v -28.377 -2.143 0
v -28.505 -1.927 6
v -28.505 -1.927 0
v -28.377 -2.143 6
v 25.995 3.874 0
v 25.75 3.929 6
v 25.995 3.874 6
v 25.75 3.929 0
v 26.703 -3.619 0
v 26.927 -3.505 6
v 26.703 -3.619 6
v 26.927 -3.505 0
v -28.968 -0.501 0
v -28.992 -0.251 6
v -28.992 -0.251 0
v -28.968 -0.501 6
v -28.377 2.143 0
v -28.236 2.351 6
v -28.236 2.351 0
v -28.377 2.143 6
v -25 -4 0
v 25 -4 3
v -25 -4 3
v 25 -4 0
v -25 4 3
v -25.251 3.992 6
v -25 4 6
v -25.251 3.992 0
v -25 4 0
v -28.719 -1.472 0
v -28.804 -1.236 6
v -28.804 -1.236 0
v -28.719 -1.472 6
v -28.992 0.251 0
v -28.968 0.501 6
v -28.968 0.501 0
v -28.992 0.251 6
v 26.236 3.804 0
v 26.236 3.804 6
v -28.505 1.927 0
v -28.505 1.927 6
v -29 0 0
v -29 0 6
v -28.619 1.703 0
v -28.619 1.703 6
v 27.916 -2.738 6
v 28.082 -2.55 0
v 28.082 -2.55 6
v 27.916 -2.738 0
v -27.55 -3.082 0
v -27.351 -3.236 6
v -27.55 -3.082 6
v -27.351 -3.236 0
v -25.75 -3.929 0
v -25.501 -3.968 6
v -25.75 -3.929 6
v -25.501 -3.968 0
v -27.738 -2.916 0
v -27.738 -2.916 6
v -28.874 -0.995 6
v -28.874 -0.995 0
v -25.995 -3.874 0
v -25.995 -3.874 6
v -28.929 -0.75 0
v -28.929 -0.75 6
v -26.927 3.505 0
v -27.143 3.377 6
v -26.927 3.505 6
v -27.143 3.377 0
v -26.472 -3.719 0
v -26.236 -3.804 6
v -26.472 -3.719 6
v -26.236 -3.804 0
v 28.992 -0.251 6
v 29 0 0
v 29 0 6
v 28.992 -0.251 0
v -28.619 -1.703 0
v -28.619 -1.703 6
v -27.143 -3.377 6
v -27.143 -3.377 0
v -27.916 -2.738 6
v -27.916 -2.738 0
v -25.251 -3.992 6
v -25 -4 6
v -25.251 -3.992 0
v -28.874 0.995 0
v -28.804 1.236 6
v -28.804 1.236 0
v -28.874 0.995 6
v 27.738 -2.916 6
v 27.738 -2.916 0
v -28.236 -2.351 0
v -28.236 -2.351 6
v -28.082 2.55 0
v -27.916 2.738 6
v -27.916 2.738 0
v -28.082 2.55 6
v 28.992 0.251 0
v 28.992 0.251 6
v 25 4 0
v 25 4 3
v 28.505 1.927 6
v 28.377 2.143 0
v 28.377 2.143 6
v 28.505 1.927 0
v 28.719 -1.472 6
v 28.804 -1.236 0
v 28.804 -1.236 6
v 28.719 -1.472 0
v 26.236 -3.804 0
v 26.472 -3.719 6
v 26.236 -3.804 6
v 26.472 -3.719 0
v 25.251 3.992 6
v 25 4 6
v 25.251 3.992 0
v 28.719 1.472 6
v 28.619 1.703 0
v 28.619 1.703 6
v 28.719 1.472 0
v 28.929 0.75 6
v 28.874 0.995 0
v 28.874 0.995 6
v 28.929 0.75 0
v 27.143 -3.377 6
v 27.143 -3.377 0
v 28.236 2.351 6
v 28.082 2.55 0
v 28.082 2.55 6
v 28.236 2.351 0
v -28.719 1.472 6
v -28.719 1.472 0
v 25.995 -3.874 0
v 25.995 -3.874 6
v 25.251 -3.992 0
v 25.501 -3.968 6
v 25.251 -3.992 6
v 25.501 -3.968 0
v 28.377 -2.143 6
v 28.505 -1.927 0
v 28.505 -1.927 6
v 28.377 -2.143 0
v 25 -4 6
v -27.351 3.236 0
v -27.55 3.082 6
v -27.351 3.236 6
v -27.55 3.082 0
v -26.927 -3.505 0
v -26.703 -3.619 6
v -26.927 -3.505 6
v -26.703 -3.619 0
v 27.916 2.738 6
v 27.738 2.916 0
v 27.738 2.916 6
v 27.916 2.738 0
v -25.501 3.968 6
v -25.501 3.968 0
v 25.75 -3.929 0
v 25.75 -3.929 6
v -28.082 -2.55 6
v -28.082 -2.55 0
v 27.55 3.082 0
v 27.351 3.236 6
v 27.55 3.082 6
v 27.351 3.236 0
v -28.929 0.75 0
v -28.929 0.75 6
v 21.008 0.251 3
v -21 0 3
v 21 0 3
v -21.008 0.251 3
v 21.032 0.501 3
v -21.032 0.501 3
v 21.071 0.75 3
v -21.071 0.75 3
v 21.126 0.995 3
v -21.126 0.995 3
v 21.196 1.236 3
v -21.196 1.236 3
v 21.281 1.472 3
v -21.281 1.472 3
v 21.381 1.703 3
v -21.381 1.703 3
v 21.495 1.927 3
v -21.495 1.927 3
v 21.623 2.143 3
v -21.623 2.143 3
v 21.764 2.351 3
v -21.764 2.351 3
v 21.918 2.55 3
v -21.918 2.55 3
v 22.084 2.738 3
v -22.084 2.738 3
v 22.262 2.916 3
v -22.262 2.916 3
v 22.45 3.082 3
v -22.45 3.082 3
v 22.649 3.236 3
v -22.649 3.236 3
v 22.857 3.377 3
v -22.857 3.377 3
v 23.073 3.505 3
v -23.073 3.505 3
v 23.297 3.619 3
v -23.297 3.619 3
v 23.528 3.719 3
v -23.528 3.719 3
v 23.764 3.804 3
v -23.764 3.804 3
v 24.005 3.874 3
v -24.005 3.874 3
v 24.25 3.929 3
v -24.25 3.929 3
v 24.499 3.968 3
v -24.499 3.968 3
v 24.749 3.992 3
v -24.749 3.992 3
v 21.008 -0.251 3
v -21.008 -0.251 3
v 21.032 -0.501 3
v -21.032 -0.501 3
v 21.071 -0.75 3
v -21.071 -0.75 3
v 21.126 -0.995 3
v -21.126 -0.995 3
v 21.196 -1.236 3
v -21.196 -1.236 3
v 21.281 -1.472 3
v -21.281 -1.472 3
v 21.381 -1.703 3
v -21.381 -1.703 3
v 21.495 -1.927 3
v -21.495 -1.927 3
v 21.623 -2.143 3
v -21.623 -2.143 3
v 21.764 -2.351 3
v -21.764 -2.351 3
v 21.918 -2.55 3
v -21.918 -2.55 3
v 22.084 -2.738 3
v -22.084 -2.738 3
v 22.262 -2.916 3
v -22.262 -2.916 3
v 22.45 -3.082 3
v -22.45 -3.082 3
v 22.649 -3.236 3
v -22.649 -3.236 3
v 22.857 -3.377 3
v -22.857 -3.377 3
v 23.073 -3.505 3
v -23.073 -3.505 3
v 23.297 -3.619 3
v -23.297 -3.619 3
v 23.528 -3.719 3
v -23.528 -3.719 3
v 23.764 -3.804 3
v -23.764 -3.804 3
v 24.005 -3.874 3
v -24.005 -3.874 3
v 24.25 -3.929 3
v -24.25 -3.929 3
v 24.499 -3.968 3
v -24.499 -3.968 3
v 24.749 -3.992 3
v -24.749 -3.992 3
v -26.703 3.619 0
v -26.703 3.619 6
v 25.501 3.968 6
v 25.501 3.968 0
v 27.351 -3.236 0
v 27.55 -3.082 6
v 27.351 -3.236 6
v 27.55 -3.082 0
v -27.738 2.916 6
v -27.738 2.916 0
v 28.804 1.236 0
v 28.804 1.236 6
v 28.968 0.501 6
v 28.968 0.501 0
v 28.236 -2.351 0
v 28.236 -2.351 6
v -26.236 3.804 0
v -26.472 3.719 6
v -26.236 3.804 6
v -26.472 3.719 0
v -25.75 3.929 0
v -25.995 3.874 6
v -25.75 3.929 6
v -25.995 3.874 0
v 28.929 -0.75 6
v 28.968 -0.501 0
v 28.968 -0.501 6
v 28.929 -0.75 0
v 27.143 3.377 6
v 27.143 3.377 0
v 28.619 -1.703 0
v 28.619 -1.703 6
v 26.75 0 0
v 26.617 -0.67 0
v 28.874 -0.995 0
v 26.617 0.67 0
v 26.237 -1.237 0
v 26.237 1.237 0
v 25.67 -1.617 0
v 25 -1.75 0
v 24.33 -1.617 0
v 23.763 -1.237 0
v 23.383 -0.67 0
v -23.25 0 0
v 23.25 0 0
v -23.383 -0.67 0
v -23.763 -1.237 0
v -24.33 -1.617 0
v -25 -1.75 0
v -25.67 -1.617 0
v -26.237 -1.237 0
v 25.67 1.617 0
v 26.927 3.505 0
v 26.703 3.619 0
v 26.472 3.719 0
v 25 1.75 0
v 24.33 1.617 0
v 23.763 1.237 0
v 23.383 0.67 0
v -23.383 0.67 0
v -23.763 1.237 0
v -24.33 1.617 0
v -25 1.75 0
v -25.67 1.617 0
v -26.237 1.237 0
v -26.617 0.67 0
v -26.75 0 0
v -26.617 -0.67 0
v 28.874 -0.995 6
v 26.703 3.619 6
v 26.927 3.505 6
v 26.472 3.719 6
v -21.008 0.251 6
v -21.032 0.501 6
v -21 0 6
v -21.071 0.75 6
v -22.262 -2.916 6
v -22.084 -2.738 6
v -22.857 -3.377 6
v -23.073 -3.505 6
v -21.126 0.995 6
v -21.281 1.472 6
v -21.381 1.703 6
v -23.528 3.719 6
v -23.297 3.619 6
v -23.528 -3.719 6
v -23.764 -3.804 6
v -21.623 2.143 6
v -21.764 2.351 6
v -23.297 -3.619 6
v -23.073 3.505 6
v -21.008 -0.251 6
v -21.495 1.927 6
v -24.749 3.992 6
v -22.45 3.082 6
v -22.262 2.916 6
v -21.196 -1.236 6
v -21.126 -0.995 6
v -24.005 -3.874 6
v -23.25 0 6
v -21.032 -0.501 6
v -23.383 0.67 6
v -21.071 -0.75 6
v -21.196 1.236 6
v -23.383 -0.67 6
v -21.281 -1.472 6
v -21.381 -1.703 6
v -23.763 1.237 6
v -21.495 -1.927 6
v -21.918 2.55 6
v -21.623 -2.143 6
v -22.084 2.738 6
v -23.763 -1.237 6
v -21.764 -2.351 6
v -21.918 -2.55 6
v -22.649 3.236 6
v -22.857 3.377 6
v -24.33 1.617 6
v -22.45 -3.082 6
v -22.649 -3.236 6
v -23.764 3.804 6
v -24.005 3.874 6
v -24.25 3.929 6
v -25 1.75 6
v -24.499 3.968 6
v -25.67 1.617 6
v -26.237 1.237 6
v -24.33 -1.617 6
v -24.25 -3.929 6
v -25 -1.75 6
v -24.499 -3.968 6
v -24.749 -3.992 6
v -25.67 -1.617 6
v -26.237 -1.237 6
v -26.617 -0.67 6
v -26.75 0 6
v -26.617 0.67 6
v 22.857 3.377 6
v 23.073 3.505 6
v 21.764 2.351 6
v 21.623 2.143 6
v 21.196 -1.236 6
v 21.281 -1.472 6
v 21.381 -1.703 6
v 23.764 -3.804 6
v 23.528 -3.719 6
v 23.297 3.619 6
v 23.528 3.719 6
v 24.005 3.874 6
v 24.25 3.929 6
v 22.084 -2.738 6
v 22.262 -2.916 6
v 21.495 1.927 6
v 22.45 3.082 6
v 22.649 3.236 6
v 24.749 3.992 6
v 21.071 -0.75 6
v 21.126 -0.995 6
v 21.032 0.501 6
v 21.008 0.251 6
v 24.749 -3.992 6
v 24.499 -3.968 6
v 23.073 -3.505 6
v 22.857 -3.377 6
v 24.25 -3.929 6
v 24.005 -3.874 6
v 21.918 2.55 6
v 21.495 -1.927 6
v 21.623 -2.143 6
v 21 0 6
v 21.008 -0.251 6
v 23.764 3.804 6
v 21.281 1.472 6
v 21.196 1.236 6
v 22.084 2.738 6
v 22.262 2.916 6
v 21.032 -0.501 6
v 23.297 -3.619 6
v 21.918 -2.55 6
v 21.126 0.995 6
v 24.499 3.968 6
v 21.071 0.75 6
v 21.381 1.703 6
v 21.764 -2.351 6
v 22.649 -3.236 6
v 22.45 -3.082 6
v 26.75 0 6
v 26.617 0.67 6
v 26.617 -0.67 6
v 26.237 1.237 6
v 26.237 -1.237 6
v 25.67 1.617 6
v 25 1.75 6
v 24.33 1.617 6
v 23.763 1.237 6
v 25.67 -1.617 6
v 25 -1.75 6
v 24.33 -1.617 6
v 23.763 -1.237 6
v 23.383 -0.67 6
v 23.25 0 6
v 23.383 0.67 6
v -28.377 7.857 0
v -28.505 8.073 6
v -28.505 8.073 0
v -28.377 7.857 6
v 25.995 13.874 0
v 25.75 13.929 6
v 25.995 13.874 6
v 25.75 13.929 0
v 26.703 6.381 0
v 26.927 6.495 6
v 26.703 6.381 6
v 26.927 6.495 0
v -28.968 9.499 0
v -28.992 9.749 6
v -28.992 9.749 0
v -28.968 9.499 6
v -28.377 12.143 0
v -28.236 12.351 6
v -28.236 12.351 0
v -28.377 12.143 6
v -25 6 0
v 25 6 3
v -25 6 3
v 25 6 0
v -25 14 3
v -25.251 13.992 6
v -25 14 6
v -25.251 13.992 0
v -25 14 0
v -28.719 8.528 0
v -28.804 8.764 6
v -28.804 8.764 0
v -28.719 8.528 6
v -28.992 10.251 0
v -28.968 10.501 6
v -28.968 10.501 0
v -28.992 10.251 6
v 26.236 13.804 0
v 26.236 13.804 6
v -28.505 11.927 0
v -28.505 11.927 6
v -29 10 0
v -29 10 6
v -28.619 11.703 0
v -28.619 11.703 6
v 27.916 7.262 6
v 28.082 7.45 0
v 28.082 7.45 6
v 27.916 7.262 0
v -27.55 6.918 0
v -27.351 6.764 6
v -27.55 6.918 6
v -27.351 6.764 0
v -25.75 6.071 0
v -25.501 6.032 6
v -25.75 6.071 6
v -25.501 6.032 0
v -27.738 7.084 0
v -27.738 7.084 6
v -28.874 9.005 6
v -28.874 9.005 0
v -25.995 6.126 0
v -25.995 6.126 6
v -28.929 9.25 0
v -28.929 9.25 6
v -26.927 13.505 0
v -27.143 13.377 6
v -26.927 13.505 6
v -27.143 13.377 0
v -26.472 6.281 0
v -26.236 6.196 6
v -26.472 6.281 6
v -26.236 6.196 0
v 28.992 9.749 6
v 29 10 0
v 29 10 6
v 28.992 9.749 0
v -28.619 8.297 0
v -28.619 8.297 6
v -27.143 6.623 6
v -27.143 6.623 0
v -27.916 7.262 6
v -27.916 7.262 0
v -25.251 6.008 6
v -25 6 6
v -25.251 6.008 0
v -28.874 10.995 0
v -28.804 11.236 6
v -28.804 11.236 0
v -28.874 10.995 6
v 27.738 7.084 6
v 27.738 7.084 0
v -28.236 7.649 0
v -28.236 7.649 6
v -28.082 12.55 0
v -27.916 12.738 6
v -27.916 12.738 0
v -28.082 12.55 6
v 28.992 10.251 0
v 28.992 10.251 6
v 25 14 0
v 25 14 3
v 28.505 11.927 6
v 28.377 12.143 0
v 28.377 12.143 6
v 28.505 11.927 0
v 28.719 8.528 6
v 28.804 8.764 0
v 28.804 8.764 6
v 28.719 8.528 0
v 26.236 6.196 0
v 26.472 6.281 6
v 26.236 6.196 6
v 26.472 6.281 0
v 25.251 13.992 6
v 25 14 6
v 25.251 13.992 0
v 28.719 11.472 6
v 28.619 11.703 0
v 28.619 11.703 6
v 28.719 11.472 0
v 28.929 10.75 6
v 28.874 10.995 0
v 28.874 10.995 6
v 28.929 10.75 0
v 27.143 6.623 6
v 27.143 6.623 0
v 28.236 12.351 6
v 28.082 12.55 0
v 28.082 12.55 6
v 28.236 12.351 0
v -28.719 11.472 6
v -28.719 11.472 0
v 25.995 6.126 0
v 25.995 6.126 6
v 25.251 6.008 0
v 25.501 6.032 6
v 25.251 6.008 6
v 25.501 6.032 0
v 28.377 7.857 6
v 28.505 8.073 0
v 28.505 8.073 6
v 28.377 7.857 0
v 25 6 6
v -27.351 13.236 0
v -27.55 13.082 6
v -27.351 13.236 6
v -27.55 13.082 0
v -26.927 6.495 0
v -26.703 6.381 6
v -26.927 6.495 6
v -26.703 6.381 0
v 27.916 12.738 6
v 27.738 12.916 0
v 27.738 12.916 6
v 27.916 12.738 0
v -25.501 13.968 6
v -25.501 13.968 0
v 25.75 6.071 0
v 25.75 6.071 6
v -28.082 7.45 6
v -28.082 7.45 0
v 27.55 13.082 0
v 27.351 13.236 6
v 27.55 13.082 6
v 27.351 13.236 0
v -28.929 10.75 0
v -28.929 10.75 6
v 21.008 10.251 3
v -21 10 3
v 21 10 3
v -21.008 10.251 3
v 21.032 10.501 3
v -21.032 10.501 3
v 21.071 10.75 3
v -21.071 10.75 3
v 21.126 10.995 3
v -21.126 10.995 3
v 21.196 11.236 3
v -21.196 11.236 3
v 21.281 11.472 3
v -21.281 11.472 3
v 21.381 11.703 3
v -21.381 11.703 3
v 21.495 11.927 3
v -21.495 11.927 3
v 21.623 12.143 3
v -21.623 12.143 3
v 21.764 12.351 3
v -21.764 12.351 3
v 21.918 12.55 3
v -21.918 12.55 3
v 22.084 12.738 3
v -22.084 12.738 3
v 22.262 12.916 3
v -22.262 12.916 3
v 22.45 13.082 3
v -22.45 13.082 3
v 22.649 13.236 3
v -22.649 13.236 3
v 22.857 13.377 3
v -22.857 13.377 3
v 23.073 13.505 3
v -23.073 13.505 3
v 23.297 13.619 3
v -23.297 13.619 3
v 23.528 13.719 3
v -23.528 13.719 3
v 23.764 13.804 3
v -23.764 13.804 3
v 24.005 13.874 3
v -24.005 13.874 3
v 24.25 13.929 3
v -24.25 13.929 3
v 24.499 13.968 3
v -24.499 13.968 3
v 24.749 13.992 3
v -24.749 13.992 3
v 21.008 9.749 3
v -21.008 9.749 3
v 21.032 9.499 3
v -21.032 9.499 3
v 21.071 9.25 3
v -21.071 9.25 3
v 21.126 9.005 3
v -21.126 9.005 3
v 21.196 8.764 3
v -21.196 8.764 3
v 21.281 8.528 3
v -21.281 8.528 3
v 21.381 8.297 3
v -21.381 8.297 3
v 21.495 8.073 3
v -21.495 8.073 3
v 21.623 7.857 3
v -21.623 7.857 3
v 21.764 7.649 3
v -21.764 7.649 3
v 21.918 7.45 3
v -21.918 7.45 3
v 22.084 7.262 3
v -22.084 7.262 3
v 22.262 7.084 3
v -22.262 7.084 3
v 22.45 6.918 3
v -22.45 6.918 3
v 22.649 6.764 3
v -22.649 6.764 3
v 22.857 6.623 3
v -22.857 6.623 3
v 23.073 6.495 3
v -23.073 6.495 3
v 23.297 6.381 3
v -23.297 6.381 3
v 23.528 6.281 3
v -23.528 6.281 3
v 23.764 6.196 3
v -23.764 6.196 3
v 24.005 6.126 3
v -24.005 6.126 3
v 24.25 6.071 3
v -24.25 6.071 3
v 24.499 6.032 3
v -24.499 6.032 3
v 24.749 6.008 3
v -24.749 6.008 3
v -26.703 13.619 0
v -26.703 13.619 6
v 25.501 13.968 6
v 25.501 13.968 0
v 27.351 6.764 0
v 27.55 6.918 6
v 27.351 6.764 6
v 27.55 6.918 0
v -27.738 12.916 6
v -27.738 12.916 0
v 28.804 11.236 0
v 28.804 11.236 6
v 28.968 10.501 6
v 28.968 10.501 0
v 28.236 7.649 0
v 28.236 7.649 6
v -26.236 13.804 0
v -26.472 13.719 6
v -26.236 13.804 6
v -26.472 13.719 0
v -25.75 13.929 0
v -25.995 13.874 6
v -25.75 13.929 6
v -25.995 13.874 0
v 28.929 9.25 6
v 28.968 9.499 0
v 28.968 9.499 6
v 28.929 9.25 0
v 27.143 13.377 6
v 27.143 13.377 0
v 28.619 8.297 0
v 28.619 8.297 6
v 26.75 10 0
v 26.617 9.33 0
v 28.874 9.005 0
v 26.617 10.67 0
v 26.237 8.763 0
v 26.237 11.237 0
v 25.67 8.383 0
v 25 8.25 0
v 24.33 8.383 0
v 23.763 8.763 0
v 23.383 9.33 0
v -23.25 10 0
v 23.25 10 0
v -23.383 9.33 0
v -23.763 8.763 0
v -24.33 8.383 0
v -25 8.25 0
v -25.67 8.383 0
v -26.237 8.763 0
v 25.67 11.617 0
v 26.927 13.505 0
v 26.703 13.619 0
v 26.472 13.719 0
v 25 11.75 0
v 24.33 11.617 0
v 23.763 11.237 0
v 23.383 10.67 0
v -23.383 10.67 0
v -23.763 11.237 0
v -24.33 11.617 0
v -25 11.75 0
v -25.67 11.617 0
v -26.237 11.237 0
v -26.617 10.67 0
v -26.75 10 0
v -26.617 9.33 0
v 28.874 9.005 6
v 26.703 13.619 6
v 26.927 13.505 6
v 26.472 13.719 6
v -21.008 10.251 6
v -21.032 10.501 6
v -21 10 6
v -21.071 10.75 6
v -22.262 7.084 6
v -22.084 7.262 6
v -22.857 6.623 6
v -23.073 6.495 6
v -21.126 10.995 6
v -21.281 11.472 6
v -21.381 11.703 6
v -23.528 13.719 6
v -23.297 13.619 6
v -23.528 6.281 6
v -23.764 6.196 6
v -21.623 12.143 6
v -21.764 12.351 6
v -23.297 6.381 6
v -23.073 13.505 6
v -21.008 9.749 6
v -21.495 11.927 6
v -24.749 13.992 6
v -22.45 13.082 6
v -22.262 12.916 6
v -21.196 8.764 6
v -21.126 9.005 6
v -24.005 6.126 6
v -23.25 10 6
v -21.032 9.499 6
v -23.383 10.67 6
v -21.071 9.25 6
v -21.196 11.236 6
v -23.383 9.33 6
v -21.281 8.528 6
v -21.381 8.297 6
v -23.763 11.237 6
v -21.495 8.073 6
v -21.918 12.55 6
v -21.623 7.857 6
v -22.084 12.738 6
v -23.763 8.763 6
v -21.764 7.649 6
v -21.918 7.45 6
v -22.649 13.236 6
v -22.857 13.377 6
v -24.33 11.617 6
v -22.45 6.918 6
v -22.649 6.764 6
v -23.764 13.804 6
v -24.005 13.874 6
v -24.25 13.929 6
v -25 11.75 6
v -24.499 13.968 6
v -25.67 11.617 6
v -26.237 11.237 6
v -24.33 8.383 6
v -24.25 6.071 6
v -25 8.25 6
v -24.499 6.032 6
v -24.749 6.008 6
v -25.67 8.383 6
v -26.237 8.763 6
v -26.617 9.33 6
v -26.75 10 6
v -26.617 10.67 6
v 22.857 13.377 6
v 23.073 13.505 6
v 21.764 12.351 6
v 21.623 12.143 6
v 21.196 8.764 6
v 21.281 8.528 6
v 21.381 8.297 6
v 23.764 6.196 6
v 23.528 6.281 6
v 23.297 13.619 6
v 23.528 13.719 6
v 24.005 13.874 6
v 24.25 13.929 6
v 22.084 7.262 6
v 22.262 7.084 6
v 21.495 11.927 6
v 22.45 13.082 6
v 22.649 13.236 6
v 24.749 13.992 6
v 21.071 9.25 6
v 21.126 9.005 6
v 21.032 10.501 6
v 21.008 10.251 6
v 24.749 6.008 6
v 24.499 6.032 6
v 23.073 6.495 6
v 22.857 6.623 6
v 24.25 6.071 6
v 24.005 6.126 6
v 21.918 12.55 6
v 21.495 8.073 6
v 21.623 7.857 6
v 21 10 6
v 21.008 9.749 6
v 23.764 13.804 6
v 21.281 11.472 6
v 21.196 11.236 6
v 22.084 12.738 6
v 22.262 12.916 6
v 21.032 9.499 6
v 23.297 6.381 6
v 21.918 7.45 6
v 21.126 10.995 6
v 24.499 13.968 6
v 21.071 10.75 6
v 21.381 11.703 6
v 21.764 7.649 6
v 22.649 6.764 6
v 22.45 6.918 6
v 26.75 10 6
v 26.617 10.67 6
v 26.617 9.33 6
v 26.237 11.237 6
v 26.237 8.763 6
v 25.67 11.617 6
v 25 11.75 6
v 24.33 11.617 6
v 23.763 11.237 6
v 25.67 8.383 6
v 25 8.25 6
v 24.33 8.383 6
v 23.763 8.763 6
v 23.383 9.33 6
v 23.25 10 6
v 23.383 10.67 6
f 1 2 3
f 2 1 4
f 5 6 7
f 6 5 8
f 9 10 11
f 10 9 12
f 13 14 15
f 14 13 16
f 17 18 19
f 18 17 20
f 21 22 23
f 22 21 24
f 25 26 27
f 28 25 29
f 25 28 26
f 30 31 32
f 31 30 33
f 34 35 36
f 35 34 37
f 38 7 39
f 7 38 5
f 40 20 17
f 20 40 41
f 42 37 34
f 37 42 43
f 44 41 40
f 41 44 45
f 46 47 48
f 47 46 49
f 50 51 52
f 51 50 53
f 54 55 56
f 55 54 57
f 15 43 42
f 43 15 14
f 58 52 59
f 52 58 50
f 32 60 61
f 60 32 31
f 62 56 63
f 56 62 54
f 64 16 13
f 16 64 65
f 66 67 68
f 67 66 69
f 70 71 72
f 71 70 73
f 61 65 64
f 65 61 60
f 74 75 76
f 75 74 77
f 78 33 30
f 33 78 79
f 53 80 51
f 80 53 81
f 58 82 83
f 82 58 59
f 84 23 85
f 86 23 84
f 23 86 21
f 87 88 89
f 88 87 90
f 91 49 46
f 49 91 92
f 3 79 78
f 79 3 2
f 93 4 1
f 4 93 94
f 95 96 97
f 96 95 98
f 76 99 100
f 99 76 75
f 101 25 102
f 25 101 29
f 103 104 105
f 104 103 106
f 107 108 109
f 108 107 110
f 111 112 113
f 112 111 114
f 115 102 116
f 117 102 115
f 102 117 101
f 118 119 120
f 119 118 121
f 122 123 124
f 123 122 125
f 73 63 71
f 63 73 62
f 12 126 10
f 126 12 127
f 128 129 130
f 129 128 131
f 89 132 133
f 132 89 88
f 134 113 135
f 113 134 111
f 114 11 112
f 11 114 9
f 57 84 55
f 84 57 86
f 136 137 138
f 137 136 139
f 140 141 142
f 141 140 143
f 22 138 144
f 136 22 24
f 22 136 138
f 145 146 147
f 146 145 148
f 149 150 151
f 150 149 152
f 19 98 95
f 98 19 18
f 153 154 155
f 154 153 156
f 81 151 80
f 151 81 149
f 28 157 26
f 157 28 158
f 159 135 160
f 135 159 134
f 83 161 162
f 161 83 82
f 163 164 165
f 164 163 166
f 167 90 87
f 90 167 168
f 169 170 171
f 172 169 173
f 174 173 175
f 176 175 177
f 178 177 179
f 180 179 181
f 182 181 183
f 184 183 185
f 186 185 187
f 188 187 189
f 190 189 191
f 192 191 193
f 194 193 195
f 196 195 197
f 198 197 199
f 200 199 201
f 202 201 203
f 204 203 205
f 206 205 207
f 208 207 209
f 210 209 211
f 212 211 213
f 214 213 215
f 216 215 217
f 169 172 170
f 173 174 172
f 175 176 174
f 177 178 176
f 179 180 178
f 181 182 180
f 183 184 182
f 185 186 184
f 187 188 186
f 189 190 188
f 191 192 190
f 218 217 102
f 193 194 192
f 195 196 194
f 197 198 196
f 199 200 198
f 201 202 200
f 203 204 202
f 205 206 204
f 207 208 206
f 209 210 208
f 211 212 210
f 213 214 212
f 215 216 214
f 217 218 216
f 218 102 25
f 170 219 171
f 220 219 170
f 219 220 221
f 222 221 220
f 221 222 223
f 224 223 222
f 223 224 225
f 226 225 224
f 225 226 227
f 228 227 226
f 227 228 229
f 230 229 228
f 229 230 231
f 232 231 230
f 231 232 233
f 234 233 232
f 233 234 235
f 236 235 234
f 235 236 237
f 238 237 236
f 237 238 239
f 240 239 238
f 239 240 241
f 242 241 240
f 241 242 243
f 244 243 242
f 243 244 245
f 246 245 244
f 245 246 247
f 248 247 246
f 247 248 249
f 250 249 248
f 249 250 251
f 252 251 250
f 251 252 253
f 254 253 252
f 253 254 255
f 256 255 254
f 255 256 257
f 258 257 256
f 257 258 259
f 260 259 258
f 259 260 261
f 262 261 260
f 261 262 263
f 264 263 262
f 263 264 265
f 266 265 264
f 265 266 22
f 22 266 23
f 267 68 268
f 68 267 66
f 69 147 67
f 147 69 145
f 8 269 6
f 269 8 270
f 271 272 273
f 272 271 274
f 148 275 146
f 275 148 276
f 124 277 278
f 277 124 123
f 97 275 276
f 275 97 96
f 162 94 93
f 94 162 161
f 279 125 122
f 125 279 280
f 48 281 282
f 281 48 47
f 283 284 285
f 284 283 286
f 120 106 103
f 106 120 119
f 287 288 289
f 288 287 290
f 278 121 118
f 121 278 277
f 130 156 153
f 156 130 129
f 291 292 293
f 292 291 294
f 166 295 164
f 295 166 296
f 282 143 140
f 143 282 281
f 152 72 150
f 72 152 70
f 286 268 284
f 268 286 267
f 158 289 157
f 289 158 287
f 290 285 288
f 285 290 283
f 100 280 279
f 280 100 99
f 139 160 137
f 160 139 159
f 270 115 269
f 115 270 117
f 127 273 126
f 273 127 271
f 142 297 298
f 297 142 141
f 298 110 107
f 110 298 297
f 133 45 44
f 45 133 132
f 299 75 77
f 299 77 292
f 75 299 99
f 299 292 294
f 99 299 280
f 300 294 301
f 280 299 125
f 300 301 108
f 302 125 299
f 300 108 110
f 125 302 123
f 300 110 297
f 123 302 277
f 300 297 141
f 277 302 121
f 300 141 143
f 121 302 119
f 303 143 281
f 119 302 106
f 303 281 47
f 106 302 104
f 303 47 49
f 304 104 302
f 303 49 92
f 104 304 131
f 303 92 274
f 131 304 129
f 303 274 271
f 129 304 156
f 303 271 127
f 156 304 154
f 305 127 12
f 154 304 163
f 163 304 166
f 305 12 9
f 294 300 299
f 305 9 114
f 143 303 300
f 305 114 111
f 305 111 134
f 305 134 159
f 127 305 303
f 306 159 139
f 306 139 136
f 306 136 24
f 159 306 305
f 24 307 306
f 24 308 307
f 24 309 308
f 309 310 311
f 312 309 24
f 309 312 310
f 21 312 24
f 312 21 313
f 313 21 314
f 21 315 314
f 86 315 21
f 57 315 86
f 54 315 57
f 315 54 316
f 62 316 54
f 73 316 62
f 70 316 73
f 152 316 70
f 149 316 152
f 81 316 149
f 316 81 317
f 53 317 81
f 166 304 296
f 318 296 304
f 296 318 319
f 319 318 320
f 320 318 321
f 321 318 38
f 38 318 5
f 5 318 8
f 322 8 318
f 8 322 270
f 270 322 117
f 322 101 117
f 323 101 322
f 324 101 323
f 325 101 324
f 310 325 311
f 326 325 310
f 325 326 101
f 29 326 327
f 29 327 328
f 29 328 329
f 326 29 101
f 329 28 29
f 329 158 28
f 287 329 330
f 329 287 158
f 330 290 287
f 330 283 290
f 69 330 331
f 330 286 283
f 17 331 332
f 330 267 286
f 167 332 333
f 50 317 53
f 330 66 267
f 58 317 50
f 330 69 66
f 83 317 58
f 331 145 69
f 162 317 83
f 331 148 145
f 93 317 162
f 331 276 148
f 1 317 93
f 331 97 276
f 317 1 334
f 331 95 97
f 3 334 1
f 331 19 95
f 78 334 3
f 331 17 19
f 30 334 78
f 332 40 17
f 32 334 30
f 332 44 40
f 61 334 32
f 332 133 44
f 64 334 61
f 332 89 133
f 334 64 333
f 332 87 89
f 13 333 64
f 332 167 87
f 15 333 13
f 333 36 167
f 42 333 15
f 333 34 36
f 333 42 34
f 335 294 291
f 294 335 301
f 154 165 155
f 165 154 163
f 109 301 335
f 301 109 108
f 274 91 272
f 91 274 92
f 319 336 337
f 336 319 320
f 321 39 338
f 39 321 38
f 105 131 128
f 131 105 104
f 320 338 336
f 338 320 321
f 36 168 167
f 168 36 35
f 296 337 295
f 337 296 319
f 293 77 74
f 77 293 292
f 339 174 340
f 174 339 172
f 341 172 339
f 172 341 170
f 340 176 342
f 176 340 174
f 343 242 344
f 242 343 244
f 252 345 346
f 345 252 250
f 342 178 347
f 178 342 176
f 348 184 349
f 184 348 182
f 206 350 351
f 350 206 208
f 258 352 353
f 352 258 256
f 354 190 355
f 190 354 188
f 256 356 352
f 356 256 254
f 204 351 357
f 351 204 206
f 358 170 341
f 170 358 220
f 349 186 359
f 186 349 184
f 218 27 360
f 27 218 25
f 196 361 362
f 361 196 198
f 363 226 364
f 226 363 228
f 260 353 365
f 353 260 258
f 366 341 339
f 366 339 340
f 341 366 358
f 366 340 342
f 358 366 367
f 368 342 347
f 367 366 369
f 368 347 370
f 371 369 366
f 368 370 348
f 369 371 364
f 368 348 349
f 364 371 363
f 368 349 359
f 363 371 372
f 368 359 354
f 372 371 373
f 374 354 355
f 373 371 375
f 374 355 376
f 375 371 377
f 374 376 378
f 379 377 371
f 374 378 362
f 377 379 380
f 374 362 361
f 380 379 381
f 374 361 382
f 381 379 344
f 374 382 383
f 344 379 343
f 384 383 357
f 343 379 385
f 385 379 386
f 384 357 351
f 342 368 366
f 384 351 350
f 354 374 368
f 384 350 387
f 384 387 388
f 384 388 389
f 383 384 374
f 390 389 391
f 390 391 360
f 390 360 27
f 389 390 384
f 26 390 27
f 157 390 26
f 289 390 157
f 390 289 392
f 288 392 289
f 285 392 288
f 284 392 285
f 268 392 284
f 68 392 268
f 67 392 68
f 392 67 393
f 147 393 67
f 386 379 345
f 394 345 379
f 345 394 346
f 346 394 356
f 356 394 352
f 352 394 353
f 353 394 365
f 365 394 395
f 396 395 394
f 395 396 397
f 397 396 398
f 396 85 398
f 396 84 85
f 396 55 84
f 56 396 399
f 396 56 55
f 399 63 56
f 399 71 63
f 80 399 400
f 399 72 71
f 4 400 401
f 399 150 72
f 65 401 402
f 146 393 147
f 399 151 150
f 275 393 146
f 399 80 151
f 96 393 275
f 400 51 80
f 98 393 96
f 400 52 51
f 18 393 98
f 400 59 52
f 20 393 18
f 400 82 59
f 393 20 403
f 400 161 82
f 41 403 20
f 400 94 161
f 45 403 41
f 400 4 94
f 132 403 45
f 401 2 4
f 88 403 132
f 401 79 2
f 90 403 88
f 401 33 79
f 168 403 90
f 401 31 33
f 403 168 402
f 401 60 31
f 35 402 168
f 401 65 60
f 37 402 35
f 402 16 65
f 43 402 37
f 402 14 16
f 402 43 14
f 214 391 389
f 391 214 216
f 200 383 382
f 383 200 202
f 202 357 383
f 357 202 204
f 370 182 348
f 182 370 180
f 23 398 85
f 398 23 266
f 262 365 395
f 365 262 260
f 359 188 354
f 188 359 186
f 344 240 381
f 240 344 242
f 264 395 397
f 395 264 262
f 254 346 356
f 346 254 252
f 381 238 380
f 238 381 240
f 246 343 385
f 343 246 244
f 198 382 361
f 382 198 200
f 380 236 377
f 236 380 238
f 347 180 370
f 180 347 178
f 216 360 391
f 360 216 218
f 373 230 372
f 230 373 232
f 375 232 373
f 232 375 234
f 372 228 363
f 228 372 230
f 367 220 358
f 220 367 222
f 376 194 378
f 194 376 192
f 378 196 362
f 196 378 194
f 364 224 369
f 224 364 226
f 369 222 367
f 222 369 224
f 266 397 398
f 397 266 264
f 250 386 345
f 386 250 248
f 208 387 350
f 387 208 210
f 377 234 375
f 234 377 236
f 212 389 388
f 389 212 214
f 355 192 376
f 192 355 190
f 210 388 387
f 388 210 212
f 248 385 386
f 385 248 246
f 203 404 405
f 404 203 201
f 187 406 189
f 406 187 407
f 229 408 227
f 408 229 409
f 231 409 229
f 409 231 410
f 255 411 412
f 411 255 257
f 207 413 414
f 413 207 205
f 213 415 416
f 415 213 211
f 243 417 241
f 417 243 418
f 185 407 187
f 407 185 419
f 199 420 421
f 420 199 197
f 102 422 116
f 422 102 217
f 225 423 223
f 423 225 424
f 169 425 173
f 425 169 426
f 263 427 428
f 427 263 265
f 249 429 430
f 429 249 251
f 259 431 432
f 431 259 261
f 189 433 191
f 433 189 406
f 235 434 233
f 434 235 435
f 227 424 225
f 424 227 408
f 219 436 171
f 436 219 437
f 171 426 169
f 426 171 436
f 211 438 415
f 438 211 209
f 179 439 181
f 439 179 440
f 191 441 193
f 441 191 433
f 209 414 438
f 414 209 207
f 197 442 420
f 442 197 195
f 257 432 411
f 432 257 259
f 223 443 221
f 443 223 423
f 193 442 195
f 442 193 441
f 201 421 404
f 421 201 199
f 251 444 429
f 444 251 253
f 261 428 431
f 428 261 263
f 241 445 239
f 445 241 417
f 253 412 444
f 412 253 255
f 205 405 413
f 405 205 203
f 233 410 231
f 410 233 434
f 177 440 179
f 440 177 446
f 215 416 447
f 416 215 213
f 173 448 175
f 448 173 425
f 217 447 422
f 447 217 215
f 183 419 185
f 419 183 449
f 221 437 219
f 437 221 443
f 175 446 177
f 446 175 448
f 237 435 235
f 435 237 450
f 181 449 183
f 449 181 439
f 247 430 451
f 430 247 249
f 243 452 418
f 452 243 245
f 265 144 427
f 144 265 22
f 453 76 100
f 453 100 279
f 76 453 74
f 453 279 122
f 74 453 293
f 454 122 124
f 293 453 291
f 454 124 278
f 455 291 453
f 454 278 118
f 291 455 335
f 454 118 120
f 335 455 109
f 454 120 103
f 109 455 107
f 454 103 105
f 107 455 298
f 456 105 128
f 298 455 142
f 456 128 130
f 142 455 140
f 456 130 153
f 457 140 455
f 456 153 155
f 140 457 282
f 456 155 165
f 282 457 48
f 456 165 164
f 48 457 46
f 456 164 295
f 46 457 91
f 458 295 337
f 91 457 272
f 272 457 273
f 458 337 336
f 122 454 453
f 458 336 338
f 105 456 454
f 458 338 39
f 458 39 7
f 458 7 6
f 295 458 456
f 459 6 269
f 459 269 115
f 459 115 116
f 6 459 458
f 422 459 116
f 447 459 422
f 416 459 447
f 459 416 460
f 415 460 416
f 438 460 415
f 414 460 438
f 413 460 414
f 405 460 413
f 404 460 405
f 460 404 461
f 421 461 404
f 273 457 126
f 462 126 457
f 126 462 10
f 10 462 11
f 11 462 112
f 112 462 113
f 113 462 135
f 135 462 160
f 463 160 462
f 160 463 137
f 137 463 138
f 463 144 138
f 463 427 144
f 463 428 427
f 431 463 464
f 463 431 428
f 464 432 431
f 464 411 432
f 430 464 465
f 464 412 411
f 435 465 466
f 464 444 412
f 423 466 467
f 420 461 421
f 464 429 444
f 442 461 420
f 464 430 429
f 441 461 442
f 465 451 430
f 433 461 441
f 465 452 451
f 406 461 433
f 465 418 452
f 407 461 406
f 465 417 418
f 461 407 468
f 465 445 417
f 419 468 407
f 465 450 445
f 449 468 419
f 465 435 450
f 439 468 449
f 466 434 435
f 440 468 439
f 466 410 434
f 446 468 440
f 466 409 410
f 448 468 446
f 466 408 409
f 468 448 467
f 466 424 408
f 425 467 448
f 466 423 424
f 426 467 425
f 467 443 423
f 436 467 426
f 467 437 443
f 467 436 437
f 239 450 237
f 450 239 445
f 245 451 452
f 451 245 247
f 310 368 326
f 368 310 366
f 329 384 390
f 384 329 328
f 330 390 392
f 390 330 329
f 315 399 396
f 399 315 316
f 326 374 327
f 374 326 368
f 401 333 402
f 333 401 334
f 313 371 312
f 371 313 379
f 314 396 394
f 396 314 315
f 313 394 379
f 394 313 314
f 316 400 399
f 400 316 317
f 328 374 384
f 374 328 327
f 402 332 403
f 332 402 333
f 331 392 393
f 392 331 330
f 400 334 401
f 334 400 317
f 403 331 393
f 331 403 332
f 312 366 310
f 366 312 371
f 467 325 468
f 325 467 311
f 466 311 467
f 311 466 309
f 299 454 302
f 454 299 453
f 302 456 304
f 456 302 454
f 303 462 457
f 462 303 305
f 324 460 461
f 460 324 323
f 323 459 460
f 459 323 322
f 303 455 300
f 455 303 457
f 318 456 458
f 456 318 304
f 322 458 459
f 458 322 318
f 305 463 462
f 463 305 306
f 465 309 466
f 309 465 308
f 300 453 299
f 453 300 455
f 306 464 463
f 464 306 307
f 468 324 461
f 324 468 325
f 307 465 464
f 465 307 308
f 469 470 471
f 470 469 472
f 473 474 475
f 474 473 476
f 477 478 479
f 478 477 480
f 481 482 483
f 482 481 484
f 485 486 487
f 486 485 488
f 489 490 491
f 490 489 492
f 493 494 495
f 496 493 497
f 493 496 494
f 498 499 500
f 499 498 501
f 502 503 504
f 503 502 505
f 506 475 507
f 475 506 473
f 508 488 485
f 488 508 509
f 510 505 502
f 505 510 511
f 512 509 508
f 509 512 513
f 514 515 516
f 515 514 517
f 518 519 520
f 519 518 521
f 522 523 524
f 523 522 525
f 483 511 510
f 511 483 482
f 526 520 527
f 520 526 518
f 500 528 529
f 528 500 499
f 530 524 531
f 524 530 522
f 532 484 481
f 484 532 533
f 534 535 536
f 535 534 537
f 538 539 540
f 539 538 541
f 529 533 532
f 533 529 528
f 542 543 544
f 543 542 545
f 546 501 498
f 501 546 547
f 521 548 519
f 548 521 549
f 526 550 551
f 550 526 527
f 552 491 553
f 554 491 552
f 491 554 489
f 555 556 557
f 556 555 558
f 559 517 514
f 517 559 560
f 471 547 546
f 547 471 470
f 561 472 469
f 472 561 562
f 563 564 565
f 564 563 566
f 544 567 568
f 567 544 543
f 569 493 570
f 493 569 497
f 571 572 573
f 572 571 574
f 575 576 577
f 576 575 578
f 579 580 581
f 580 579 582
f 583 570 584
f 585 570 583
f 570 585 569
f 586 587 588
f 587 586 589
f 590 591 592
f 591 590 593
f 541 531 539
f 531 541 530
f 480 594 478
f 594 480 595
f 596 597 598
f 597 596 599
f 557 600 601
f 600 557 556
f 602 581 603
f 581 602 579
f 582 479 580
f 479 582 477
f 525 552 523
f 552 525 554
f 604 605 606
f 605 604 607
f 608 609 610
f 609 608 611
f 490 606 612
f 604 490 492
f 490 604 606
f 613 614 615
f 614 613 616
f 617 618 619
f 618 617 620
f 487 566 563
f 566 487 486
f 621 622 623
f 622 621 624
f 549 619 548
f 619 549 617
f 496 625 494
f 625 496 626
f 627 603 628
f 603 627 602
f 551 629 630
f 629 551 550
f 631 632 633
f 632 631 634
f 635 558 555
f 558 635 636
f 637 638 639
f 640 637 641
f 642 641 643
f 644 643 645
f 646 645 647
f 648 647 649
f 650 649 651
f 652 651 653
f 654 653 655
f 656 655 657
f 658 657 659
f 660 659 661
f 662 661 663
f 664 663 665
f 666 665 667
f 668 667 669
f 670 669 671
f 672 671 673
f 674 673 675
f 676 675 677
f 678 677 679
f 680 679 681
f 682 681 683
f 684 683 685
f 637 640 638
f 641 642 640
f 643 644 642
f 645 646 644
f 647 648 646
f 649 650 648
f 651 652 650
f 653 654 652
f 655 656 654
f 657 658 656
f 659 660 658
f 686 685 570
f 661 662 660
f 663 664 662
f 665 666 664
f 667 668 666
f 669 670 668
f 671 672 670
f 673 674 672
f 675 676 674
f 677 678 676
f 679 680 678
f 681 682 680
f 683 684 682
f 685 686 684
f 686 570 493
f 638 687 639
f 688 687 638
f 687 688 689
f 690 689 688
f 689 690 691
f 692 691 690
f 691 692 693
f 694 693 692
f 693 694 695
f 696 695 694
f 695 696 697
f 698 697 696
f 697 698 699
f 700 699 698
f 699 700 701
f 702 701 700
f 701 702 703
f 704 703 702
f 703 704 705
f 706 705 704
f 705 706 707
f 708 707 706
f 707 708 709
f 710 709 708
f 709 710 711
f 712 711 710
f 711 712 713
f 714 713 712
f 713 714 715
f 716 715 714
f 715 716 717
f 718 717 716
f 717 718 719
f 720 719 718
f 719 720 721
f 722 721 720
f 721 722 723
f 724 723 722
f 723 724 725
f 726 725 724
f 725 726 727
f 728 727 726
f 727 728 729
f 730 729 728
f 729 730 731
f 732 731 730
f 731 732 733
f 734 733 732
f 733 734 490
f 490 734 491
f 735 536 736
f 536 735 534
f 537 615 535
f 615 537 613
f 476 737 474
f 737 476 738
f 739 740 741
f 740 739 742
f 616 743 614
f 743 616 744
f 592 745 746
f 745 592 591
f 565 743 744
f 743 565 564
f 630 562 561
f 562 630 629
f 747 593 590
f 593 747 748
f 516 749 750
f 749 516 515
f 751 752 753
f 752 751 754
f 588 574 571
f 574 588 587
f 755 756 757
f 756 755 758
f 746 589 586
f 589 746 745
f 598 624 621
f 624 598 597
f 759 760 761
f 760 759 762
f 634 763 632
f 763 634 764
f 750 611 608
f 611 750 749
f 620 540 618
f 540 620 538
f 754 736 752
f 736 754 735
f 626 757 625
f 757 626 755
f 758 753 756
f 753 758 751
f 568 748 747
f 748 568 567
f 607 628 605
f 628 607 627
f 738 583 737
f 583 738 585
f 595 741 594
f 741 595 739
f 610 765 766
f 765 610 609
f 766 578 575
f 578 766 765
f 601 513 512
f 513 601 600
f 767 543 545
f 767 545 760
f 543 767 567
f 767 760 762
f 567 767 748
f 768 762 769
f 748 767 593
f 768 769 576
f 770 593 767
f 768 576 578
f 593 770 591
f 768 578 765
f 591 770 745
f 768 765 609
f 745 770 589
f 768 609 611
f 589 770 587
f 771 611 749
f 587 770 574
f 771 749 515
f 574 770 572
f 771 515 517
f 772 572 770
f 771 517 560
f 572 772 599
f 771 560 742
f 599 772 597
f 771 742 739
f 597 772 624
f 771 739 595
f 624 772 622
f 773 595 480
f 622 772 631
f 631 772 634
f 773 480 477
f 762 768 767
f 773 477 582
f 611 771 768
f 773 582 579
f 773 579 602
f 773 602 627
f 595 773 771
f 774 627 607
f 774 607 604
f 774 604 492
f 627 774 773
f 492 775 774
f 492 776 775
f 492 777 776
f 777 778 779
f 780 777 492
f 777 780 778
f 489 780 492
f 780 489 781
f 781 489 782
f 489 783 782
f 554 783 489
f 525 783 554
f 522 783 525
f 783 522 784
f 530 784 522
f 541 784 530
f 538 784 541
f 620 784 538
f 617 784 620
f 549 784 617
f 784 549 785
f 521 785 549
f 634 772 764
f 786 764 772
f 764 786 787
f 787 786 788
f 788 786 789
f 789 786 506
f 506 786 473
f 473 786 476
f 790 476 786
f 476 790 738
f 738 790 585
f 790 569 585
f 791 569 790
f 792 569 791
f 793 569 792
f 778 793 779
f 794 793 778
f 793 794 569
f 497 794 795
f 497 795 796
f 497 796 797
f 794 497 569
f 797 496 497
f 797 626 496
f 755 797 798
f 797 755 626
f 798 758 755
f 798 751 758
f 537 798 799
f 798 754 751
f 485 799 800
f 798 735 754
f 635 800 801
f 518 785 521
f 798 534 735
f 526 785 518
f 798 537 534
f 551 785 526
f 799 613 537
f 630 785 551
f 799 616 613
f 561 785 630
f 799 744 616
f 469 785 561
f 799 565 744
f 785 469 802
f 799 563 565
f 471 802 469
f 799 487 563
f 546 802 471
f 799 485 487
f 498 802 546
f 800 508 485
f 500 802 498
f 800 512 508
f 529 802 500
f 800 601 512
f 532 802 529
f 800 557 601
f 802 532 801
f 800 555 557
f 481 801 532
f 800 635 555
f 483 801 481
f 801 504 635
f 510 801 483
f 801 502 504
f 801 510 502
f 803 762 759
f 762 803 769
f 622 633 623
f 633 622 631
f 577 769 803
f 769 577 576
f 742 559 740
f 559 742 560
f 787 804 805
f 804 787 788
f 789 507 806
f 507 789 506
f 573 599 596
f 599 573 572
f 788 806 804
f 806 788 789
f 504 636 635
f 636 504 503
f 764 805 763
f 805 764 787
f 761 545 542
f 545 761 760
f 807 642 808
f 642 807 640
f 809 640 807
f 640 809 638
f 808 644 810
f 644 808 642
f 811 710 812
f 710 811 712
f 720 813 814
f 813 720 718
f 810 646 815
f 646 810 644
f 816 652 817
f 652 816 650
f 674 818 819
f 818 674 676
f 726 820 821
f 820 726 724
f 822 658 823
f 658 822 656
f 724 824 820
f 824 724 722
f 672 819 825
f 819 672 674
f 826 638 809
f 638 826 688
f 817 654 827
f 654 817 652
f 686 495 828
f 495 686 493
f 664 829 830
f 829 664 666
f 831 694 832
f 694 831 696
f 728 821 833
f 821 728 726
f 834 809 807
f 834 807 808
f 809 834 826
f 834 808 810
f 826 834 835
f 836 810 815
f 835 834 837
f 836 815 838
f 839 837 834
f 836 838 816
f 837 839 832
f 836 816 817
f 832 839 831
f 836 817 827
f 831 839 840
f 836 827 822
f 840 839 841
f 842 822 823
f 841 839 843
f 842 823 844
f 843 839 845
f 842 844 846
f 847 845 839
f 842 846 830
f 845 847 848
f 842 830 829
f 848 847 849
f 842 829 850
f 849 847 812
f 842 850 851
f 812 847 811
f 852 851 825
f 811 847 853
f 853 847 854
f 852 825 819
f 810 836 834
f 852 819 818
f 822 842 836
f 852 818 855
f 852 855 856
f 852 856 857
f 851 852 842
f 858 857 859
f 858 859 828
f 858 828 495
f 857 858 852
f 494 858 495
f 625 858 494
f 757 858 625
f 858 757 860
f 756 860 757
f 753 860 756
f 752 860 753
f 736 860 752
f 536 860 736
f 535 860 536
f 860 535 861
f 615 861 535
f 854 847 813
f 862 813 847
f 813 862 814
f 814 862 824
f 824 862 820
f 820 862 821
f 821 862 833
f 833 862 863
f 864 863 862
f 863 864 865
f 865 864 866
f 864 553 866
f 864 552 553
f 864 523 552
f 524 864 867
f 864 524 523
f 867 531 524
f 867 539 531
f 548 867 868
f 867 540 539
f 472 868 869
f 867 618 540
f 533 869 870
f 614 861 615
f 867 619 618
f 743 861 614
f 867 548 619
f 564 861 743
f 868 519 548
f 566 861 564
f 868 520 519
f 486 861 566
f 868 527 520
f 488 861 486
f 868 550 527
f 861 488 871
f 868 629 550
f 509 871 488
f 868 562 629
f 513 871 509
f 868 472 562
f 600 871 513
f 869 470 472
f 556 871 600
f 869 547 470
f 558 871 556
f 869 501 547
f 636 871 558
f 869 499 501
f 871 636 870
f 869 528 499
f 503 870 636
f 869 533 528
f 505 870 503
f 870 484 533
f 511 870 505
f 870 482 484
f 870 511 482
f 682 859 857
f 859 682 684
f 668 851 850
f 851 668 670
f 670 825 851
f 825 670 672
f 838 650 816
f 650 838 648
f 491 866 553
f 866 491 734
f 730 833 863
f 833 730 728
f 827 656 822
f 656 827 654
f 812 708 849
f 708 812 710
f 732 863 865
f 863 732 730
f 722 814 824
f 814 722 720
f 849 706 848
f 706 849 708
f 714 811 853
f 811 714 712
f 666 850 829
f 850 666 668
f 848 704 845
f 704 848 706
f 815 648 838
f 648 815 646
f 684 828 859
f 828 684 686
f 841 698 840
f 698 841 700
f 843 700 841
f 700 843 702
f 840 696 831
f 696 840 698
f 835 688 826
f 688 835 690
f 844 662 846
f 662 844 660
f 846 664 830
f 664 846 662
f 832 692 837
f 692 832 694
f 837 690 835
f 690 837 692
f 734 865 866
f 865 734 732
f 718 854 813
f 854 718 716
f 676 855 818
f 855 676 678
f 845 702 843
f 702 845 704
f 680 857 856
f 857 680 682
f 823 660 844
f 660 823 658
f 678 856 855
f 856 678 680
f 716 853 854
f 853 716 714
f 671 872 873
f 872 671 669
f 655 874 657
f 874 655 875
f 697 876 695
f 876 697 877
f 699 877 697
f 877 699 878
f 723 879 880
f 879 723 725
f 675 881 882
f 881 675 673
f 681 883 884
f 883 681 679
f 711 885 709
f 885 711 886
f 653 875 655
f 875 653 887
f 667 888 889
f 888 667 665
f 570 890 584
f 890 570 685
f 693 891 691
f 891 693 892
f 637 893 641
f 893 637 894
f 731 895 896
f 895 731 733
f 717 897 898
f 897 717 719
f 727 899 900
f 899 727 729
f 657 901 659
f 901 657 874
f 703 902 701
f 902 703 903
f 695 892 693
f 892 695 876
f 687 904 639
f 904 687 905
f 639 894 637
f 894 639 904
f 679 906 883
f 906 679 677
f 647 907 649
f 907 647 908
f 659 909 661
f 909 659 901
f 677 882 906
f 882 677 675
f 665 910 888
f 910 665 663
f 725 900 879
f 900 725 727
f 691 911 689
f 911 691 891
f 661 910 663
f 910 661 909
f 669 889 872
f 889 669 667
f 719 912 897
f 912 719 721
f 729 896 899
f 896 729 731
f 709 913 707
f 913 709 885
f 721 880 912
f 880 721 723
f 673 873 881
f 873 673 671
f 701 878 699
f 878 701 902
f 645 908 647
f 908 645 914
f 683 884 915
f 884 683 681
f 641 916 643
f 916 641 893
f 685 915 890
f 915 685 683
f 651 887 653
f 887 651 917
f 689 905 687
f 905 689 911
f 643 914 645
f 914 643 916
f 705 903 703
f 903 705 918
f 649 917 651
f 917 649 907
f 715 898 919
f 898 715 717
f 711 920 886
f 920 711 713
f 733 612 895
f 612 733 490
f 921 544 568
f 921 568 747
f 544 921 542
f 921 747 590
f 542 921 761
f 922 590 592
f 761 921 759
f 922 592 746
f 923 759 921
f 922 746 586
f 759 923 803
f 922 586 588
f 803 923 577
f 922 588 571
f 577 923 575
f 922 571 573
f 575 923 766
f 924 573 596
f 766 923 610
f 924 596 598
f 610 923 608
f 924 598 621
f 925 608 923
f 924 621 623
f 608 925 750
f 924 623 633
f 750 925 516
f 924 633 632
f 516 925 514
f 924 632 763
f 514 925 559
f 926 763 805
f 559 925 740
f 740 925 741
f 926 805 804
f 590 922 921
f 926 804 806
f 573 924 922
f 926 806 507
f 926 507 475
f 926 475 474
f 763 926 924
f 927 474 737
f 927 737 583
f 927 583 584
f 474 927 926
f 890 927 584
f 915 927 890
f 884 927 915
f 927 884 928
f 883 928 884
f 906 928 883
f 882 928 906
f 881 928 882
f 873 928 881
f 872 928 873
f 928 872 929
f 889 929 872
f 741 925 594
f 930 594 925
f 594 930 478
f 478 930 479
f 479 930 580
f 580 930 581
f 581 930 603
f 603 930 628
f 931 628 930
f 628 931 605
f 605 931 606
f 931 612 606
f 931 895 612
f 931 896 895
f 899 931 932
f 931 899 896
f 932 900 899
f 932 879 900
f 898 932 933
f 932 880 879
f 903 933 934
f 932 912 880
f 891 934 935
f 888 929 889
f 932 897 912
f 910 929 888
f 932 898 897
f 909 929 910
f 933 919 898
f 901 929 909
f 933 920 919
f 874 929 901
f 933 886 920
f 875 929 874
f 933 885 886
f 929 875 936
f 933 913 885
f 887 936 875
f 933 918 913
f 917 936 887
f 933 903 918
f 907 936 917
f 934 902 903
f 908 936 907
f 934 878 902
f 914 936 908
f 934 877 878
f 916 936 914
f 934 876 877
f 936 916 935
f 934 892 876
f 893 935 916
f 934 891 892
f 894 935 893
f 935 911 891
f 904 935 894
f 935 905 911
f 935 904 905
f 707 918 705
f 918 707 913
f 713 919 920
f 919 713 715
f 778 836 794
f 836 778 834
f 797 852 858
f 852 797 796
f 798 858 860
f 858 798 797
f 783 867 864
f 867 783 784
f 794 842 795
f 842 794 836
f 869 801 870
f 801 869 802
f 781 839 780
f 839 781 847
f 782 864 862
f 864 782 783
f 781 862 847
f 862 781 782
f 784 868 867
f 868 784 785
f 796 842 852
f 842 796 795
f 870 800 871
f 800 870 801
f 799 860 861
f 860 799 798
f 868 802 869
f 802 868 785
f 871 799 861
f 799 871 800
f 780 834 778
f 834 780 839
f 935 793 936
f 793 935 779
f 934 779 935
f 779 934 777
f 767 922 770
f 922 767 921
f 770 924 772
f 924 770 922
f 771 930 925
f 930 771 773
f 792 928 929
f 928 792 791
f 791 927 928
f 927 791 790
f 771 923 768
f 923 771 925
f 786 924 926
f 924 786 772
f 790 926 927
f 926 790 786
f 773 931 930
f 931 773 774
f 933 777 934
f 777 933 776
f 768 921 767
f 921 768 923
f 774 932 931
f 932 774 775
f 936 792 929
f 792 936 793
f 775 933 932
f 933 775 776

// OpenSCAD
// file: ../config.scad
r4 = 2.2;
r8 = 4.2;
r10 = 5.2;

layer_height = 0.25;

switch_d = 9.6;

nema17_r_vis = 15.5;
nema17_r_centre = 11.5;
nema17_h_centre = 2;
nema17_h = 43;
nema17_l = 40;

boite_ui_largeur = 28.5;
boite_ui_l = 46;

support_laser = 24;

r3 = 1.75;
r3_2d = 1.5;
r3_vis = 1.65;
r3_head = 3.6;
m3_r = r3;
m3_nut_d = 7;
m3_nut_d2 = 6.2;
m3_nut_h = 3;

m4_nut_d = 8;
m4_nut_d2 = 7;
m4_nut_h = 4;

608_r = 23/2;
608_h = 8;

laser_printer_l = 609;
laser_printer_lg = 456;

module support_nut(d=3, l_screw1 = 20, l_screw2 = 20, l_nut = 20, h_screw2 = -0.1){
    if(d==3){
        screw_r = r3;
        nut_r = m3_nut_d/2;
        nut_h = m3_nut_h;
        cylinder(nut_h, r = nut_r, $fn = 6, center = true);
        translate([0, 0, -l_screw1])cylinder(l_screw1 +1, r = screw_r);
        translate([0, 0, m3_nut_h/2+ h_screw2])cylinder(l_screw2, r = screw_r);
        l = m3_nut_d*cos(30);
        translate([0, -l/2, -nut_h/2]) cube([l_nut, l,nut_h]);
    } else if(d==4){
        screw_r = r4;
        nut_r = m4_nut_d/2;
        nut_h = m4_nut_h;
        cylinder(nut_h, r = nut_r, $fn = 6, center = true);
        translate([0, 0, -l_screw1])cylinder(l_screw1 +1, r = screw_r);
        translate([0, 0, m4_nut_h/2+ h_screw2])cylinder(l_screw2, r = screw_r);
        l = m4_nut_d*cos(30);
        translate([0, -l/2, -nut_h/2]) cube([l_nut, l,nut_h]);
    }
}


module nut(d=3, center = false){
    nut_r = m3_nut_d/2;
    nut_h = m3_nut_h;
    if(d==3){
        nut_r = m3_nut_d/2;
        nut_h = m3_nut_h;
    } 
    cylinder(nut_h, r = nut_r, $fn = 6, center = center);
}



module m3(h, nut = false, head = false){
    cylinder(h, m3_r, m3_r, $fn=16);
    if(nut){
        cylinder(m3_nut_h, r = m3_nut_d/2, $fn = 6);
    }
}

module m3_nut(h){
    cylinder(m3_nut_h, r = m3_nut_d/2, $fn = 6);
    translate([0, -m3_nut_d2/2, 0]) cube([h, m3_nut_d2, m3_nut_h]);
}

m4_r = 2.3;
m4_nut_d = 8.4;
m4_nut_d2 = 7.5;
m4_nut_h = 3.5;
module m4(h, nut = false, head = false){
    cylinder(h, m4_r, m4_r);
    if(nut){
        cylinder(m4_nut_h, r = m4_nut_d/2, $fn = 6);
    }
}

module m5(h, nut = false, head = false){
    cylinder(h, r = 2.7);
}

m8_nut_d = 15;
m8_nut_d2 = 13;
m8_nut_h = 6.5;
module m8(h, nut = false, head = false){
    cylinder(h, r = r8);
    if(nut){
        cylinder(m8_nut_h, r = m8_nut_d/2, $fn = 6);
    }
}

module cube_arrondi(x, y, z, r=2){
    hull(){
        translate([(x/2-r), (y/2-r), 0]) cylinder(z,r=r);
        translate([(x/2-r), -(y/2-r), 0]) cylinder(z,r=r);
        translate([-(x/2-r), (y/2-r), 0]) cylinder(z,r=r);
        translate([-(x/2-r), -(y/2-r), 0]) cylinder(z,r=r);
    }
}

module demi_glissiere(r, l, h){
    cylinder(h, r, r);
    translate([-r, 0, 0]) cube([r*2, l, h]);
}


module nema17_2d(){
    nema17_l = 43;
    nema17_h = 6;
    polygon([[0,nema17_h], [nema17_h,0]
            , [nema17_l-nema17_h,0],[nema17_l,nema17_h]
            , [nema17_l,nema17_l-nema17_h],[nema17_l-nema17_h,nema17_l]
            , [8,nema17_l],[0,nema17_l-nema17_h] ]);
}

module nema17_2d2(){
    translate([nema17_r_vis, nema17_r_vis] ) circle(r3_2d);
    translate([nema17_r_vis, -nema17_r_vis] ) circle(r3_2d);
    translate([-nema17_r_vis, nema17_r_vis] ) circle(r3_2d);
    translate([-nema17_r_vis, -nema17_r_vis] ) circle(r3_2d);
    circle(nema17_r_centre);
}


module nema17(){
    translate([-nema17_h/2, -nema17_h/2, -nema17_l/2] ) linear_extrude(nema17_l) nema17_2d();
    
    h = nema17_h/2+6;
    translate([nema17_r_vis, nema17_r_vis, 0] )rotate([0, 0, 0]) cylinder(h, r = r3);
    translate([nema17_r_vis, -nema17_r_vis, 0] )rotate([0, 0, 0]) cylinder(h, r = r3);
    translate([-nema17_r_vis, nema17_r_vis, 0] )rotate([0, 0, 0]) cylinder(h, r = r3);
    translate([-nema17_r_vis, -nema17_r_vis, 0] )rotate([0, 0, 0]) cylinder(h, r = r3);
    cylinder(h, nema17_r_centre, nema17_r_centre);
    cylinder(h+14, r = 8);
    
    translate([-8.5, 0, -nema17_l/2] ) cube([17,30, 10]);
}

module corner(l_corner, h_corner, lg_corner){
    translate([0, lg_corner, 0]) rotate([90, 0, 0]) linear_extrude(lg_corner) polygon([[0,0], [l_corner, 0], [0, h_corner]]);
}


/**
 * 2D
 **/

module m3_2d(){
    circle(r3_2d);
}


module cran_x(_l, e, cran, inv){
    difference(){
        square([_l, e]);
        if(inv){
            for(i=[-round(_l/cran):round(_l/cran)]){
                translate([_l/2 + cran/2 - 2*i*cran, -1]) square([cran, e+2]);
            }
        }else{
            for(i=[-round(_l/cran):round(_l/cran)]){
                translate([_l/2 - cran/2 - 2*i*cran, -1]) square([cran, e+2]);
            }
        }
    }
}

module cran_y(_l, e, cran, inv){
    translate([e, 0]) rotate([0, 0, 90]) cran_x(_l, e, cran, inv); 
}

module whole_2d(type_vis){
    if(type_vis == 3){
        circle(1.5);
    } else if(type_vis == 4){
        circle(2);
    } else {
        echo("whole_2d " + type_vis);
    }
}

module nuts_2d(type_vis){
    if(type_vis == 3){
        translate([-1.5, 0])square([3, 20]);
        translate([-5.5/2, 10])square([5.5, 2.5]);
    } else if(type_vis == 4){
        translate([-2, 0])square([4, 30]);
        translate([-7/2, 20])square([7, 3.5]);
    } else {
        echo("nuts_2d " + type_vis);
    }
}

module cran_x_vis(_l, e, cran, type_vis = 3, trous = [0.1, 0.5, 0.9]){
    difference(){
        square([_l, e]);
        for(i=[-round(_l/cran):round(_l/cran)]){
                translate([_l/2 - cran/2 - 2*i*cran, -1]) square([cran, e+2]);
            }
        
    }
    for(i = trous){
        j = round((i-0.5)*_l/(2*cran));
        translate([_l/2  - 2*j*cran, e/2]) whole_2d(type_vis);
    }
}

module cran_x_nuts(_l, e, cran, type_vis = 3, trous = [0.1, 0.5, 0.9]){
    difference(){
        square([_l, e]);
        for(i=[-round(_l/cran):round(_l/cran)]){
                translate([_l/2 + cran/2 - 2*i*cran, -1]) square([cran, e+2]);
        }
    }
    for(i = trous){
        j = round((i-0.5)*_l/(2*cran));
        translate([_l/2  - 2*j*cran, e/2]) nuts_2d(type_vis);
    }
}

module cran_y_vis(_l, e, cran, type_vis = 3, trous = [0.1, 0.5, 0.9]){
    translate([e, 0]) rotate([0, 0, 90]) cran_x_vis(_l, e, cran, type_vis, trous);
}

module cran_y_nuts(_l, e, cran, type_vis = 3, trous = [0.1, 0.5, 0.9]){
    translate([0, _l]) rotate([0, 0, -90]) cran_x_nuts(_l, e, cran, type_vis, trous);
}


module fixation_2d(){
    translate([-5,0])square([2,4], center=true);
    translate([5,0])square([2,4], center=true);
}
// main file
include <../config.scad>;

e = 3;
e2 = 3;
l = 50;

h = e + e2;
$fn=100;
r = 4;

module cote1(){
    difference(){
        hull(){
            translate([-l/2, 0,0]) cylinder(r = r, h);
            translate([l/2, 0,0]) cylinder(r = r, h);
        }
        translate([-l/2, 0,-1]) m3(h+2);
        translate([l/2, 0,-1]) m3(h+2);
    }
}

module cote2(){
    difference(){
        union(){
            hull(){
                translate([-l/2, 0,0]) cylinder(r = r, e);
                translate([l/2, 0,0]) cylinder(r = r, e);
            }
            translate([-l/2, 0,0]) cylinder(r = r, h);
            translate([l/2, 0,0]) cylinder(r = r, h);
        }
        translate([-l/2, 0,-1]) m3(h+2);
        translate([l/2, 0,-1]) m3(h+2);
    }
}

 cote2();
translate([0, 10]) cote2();
